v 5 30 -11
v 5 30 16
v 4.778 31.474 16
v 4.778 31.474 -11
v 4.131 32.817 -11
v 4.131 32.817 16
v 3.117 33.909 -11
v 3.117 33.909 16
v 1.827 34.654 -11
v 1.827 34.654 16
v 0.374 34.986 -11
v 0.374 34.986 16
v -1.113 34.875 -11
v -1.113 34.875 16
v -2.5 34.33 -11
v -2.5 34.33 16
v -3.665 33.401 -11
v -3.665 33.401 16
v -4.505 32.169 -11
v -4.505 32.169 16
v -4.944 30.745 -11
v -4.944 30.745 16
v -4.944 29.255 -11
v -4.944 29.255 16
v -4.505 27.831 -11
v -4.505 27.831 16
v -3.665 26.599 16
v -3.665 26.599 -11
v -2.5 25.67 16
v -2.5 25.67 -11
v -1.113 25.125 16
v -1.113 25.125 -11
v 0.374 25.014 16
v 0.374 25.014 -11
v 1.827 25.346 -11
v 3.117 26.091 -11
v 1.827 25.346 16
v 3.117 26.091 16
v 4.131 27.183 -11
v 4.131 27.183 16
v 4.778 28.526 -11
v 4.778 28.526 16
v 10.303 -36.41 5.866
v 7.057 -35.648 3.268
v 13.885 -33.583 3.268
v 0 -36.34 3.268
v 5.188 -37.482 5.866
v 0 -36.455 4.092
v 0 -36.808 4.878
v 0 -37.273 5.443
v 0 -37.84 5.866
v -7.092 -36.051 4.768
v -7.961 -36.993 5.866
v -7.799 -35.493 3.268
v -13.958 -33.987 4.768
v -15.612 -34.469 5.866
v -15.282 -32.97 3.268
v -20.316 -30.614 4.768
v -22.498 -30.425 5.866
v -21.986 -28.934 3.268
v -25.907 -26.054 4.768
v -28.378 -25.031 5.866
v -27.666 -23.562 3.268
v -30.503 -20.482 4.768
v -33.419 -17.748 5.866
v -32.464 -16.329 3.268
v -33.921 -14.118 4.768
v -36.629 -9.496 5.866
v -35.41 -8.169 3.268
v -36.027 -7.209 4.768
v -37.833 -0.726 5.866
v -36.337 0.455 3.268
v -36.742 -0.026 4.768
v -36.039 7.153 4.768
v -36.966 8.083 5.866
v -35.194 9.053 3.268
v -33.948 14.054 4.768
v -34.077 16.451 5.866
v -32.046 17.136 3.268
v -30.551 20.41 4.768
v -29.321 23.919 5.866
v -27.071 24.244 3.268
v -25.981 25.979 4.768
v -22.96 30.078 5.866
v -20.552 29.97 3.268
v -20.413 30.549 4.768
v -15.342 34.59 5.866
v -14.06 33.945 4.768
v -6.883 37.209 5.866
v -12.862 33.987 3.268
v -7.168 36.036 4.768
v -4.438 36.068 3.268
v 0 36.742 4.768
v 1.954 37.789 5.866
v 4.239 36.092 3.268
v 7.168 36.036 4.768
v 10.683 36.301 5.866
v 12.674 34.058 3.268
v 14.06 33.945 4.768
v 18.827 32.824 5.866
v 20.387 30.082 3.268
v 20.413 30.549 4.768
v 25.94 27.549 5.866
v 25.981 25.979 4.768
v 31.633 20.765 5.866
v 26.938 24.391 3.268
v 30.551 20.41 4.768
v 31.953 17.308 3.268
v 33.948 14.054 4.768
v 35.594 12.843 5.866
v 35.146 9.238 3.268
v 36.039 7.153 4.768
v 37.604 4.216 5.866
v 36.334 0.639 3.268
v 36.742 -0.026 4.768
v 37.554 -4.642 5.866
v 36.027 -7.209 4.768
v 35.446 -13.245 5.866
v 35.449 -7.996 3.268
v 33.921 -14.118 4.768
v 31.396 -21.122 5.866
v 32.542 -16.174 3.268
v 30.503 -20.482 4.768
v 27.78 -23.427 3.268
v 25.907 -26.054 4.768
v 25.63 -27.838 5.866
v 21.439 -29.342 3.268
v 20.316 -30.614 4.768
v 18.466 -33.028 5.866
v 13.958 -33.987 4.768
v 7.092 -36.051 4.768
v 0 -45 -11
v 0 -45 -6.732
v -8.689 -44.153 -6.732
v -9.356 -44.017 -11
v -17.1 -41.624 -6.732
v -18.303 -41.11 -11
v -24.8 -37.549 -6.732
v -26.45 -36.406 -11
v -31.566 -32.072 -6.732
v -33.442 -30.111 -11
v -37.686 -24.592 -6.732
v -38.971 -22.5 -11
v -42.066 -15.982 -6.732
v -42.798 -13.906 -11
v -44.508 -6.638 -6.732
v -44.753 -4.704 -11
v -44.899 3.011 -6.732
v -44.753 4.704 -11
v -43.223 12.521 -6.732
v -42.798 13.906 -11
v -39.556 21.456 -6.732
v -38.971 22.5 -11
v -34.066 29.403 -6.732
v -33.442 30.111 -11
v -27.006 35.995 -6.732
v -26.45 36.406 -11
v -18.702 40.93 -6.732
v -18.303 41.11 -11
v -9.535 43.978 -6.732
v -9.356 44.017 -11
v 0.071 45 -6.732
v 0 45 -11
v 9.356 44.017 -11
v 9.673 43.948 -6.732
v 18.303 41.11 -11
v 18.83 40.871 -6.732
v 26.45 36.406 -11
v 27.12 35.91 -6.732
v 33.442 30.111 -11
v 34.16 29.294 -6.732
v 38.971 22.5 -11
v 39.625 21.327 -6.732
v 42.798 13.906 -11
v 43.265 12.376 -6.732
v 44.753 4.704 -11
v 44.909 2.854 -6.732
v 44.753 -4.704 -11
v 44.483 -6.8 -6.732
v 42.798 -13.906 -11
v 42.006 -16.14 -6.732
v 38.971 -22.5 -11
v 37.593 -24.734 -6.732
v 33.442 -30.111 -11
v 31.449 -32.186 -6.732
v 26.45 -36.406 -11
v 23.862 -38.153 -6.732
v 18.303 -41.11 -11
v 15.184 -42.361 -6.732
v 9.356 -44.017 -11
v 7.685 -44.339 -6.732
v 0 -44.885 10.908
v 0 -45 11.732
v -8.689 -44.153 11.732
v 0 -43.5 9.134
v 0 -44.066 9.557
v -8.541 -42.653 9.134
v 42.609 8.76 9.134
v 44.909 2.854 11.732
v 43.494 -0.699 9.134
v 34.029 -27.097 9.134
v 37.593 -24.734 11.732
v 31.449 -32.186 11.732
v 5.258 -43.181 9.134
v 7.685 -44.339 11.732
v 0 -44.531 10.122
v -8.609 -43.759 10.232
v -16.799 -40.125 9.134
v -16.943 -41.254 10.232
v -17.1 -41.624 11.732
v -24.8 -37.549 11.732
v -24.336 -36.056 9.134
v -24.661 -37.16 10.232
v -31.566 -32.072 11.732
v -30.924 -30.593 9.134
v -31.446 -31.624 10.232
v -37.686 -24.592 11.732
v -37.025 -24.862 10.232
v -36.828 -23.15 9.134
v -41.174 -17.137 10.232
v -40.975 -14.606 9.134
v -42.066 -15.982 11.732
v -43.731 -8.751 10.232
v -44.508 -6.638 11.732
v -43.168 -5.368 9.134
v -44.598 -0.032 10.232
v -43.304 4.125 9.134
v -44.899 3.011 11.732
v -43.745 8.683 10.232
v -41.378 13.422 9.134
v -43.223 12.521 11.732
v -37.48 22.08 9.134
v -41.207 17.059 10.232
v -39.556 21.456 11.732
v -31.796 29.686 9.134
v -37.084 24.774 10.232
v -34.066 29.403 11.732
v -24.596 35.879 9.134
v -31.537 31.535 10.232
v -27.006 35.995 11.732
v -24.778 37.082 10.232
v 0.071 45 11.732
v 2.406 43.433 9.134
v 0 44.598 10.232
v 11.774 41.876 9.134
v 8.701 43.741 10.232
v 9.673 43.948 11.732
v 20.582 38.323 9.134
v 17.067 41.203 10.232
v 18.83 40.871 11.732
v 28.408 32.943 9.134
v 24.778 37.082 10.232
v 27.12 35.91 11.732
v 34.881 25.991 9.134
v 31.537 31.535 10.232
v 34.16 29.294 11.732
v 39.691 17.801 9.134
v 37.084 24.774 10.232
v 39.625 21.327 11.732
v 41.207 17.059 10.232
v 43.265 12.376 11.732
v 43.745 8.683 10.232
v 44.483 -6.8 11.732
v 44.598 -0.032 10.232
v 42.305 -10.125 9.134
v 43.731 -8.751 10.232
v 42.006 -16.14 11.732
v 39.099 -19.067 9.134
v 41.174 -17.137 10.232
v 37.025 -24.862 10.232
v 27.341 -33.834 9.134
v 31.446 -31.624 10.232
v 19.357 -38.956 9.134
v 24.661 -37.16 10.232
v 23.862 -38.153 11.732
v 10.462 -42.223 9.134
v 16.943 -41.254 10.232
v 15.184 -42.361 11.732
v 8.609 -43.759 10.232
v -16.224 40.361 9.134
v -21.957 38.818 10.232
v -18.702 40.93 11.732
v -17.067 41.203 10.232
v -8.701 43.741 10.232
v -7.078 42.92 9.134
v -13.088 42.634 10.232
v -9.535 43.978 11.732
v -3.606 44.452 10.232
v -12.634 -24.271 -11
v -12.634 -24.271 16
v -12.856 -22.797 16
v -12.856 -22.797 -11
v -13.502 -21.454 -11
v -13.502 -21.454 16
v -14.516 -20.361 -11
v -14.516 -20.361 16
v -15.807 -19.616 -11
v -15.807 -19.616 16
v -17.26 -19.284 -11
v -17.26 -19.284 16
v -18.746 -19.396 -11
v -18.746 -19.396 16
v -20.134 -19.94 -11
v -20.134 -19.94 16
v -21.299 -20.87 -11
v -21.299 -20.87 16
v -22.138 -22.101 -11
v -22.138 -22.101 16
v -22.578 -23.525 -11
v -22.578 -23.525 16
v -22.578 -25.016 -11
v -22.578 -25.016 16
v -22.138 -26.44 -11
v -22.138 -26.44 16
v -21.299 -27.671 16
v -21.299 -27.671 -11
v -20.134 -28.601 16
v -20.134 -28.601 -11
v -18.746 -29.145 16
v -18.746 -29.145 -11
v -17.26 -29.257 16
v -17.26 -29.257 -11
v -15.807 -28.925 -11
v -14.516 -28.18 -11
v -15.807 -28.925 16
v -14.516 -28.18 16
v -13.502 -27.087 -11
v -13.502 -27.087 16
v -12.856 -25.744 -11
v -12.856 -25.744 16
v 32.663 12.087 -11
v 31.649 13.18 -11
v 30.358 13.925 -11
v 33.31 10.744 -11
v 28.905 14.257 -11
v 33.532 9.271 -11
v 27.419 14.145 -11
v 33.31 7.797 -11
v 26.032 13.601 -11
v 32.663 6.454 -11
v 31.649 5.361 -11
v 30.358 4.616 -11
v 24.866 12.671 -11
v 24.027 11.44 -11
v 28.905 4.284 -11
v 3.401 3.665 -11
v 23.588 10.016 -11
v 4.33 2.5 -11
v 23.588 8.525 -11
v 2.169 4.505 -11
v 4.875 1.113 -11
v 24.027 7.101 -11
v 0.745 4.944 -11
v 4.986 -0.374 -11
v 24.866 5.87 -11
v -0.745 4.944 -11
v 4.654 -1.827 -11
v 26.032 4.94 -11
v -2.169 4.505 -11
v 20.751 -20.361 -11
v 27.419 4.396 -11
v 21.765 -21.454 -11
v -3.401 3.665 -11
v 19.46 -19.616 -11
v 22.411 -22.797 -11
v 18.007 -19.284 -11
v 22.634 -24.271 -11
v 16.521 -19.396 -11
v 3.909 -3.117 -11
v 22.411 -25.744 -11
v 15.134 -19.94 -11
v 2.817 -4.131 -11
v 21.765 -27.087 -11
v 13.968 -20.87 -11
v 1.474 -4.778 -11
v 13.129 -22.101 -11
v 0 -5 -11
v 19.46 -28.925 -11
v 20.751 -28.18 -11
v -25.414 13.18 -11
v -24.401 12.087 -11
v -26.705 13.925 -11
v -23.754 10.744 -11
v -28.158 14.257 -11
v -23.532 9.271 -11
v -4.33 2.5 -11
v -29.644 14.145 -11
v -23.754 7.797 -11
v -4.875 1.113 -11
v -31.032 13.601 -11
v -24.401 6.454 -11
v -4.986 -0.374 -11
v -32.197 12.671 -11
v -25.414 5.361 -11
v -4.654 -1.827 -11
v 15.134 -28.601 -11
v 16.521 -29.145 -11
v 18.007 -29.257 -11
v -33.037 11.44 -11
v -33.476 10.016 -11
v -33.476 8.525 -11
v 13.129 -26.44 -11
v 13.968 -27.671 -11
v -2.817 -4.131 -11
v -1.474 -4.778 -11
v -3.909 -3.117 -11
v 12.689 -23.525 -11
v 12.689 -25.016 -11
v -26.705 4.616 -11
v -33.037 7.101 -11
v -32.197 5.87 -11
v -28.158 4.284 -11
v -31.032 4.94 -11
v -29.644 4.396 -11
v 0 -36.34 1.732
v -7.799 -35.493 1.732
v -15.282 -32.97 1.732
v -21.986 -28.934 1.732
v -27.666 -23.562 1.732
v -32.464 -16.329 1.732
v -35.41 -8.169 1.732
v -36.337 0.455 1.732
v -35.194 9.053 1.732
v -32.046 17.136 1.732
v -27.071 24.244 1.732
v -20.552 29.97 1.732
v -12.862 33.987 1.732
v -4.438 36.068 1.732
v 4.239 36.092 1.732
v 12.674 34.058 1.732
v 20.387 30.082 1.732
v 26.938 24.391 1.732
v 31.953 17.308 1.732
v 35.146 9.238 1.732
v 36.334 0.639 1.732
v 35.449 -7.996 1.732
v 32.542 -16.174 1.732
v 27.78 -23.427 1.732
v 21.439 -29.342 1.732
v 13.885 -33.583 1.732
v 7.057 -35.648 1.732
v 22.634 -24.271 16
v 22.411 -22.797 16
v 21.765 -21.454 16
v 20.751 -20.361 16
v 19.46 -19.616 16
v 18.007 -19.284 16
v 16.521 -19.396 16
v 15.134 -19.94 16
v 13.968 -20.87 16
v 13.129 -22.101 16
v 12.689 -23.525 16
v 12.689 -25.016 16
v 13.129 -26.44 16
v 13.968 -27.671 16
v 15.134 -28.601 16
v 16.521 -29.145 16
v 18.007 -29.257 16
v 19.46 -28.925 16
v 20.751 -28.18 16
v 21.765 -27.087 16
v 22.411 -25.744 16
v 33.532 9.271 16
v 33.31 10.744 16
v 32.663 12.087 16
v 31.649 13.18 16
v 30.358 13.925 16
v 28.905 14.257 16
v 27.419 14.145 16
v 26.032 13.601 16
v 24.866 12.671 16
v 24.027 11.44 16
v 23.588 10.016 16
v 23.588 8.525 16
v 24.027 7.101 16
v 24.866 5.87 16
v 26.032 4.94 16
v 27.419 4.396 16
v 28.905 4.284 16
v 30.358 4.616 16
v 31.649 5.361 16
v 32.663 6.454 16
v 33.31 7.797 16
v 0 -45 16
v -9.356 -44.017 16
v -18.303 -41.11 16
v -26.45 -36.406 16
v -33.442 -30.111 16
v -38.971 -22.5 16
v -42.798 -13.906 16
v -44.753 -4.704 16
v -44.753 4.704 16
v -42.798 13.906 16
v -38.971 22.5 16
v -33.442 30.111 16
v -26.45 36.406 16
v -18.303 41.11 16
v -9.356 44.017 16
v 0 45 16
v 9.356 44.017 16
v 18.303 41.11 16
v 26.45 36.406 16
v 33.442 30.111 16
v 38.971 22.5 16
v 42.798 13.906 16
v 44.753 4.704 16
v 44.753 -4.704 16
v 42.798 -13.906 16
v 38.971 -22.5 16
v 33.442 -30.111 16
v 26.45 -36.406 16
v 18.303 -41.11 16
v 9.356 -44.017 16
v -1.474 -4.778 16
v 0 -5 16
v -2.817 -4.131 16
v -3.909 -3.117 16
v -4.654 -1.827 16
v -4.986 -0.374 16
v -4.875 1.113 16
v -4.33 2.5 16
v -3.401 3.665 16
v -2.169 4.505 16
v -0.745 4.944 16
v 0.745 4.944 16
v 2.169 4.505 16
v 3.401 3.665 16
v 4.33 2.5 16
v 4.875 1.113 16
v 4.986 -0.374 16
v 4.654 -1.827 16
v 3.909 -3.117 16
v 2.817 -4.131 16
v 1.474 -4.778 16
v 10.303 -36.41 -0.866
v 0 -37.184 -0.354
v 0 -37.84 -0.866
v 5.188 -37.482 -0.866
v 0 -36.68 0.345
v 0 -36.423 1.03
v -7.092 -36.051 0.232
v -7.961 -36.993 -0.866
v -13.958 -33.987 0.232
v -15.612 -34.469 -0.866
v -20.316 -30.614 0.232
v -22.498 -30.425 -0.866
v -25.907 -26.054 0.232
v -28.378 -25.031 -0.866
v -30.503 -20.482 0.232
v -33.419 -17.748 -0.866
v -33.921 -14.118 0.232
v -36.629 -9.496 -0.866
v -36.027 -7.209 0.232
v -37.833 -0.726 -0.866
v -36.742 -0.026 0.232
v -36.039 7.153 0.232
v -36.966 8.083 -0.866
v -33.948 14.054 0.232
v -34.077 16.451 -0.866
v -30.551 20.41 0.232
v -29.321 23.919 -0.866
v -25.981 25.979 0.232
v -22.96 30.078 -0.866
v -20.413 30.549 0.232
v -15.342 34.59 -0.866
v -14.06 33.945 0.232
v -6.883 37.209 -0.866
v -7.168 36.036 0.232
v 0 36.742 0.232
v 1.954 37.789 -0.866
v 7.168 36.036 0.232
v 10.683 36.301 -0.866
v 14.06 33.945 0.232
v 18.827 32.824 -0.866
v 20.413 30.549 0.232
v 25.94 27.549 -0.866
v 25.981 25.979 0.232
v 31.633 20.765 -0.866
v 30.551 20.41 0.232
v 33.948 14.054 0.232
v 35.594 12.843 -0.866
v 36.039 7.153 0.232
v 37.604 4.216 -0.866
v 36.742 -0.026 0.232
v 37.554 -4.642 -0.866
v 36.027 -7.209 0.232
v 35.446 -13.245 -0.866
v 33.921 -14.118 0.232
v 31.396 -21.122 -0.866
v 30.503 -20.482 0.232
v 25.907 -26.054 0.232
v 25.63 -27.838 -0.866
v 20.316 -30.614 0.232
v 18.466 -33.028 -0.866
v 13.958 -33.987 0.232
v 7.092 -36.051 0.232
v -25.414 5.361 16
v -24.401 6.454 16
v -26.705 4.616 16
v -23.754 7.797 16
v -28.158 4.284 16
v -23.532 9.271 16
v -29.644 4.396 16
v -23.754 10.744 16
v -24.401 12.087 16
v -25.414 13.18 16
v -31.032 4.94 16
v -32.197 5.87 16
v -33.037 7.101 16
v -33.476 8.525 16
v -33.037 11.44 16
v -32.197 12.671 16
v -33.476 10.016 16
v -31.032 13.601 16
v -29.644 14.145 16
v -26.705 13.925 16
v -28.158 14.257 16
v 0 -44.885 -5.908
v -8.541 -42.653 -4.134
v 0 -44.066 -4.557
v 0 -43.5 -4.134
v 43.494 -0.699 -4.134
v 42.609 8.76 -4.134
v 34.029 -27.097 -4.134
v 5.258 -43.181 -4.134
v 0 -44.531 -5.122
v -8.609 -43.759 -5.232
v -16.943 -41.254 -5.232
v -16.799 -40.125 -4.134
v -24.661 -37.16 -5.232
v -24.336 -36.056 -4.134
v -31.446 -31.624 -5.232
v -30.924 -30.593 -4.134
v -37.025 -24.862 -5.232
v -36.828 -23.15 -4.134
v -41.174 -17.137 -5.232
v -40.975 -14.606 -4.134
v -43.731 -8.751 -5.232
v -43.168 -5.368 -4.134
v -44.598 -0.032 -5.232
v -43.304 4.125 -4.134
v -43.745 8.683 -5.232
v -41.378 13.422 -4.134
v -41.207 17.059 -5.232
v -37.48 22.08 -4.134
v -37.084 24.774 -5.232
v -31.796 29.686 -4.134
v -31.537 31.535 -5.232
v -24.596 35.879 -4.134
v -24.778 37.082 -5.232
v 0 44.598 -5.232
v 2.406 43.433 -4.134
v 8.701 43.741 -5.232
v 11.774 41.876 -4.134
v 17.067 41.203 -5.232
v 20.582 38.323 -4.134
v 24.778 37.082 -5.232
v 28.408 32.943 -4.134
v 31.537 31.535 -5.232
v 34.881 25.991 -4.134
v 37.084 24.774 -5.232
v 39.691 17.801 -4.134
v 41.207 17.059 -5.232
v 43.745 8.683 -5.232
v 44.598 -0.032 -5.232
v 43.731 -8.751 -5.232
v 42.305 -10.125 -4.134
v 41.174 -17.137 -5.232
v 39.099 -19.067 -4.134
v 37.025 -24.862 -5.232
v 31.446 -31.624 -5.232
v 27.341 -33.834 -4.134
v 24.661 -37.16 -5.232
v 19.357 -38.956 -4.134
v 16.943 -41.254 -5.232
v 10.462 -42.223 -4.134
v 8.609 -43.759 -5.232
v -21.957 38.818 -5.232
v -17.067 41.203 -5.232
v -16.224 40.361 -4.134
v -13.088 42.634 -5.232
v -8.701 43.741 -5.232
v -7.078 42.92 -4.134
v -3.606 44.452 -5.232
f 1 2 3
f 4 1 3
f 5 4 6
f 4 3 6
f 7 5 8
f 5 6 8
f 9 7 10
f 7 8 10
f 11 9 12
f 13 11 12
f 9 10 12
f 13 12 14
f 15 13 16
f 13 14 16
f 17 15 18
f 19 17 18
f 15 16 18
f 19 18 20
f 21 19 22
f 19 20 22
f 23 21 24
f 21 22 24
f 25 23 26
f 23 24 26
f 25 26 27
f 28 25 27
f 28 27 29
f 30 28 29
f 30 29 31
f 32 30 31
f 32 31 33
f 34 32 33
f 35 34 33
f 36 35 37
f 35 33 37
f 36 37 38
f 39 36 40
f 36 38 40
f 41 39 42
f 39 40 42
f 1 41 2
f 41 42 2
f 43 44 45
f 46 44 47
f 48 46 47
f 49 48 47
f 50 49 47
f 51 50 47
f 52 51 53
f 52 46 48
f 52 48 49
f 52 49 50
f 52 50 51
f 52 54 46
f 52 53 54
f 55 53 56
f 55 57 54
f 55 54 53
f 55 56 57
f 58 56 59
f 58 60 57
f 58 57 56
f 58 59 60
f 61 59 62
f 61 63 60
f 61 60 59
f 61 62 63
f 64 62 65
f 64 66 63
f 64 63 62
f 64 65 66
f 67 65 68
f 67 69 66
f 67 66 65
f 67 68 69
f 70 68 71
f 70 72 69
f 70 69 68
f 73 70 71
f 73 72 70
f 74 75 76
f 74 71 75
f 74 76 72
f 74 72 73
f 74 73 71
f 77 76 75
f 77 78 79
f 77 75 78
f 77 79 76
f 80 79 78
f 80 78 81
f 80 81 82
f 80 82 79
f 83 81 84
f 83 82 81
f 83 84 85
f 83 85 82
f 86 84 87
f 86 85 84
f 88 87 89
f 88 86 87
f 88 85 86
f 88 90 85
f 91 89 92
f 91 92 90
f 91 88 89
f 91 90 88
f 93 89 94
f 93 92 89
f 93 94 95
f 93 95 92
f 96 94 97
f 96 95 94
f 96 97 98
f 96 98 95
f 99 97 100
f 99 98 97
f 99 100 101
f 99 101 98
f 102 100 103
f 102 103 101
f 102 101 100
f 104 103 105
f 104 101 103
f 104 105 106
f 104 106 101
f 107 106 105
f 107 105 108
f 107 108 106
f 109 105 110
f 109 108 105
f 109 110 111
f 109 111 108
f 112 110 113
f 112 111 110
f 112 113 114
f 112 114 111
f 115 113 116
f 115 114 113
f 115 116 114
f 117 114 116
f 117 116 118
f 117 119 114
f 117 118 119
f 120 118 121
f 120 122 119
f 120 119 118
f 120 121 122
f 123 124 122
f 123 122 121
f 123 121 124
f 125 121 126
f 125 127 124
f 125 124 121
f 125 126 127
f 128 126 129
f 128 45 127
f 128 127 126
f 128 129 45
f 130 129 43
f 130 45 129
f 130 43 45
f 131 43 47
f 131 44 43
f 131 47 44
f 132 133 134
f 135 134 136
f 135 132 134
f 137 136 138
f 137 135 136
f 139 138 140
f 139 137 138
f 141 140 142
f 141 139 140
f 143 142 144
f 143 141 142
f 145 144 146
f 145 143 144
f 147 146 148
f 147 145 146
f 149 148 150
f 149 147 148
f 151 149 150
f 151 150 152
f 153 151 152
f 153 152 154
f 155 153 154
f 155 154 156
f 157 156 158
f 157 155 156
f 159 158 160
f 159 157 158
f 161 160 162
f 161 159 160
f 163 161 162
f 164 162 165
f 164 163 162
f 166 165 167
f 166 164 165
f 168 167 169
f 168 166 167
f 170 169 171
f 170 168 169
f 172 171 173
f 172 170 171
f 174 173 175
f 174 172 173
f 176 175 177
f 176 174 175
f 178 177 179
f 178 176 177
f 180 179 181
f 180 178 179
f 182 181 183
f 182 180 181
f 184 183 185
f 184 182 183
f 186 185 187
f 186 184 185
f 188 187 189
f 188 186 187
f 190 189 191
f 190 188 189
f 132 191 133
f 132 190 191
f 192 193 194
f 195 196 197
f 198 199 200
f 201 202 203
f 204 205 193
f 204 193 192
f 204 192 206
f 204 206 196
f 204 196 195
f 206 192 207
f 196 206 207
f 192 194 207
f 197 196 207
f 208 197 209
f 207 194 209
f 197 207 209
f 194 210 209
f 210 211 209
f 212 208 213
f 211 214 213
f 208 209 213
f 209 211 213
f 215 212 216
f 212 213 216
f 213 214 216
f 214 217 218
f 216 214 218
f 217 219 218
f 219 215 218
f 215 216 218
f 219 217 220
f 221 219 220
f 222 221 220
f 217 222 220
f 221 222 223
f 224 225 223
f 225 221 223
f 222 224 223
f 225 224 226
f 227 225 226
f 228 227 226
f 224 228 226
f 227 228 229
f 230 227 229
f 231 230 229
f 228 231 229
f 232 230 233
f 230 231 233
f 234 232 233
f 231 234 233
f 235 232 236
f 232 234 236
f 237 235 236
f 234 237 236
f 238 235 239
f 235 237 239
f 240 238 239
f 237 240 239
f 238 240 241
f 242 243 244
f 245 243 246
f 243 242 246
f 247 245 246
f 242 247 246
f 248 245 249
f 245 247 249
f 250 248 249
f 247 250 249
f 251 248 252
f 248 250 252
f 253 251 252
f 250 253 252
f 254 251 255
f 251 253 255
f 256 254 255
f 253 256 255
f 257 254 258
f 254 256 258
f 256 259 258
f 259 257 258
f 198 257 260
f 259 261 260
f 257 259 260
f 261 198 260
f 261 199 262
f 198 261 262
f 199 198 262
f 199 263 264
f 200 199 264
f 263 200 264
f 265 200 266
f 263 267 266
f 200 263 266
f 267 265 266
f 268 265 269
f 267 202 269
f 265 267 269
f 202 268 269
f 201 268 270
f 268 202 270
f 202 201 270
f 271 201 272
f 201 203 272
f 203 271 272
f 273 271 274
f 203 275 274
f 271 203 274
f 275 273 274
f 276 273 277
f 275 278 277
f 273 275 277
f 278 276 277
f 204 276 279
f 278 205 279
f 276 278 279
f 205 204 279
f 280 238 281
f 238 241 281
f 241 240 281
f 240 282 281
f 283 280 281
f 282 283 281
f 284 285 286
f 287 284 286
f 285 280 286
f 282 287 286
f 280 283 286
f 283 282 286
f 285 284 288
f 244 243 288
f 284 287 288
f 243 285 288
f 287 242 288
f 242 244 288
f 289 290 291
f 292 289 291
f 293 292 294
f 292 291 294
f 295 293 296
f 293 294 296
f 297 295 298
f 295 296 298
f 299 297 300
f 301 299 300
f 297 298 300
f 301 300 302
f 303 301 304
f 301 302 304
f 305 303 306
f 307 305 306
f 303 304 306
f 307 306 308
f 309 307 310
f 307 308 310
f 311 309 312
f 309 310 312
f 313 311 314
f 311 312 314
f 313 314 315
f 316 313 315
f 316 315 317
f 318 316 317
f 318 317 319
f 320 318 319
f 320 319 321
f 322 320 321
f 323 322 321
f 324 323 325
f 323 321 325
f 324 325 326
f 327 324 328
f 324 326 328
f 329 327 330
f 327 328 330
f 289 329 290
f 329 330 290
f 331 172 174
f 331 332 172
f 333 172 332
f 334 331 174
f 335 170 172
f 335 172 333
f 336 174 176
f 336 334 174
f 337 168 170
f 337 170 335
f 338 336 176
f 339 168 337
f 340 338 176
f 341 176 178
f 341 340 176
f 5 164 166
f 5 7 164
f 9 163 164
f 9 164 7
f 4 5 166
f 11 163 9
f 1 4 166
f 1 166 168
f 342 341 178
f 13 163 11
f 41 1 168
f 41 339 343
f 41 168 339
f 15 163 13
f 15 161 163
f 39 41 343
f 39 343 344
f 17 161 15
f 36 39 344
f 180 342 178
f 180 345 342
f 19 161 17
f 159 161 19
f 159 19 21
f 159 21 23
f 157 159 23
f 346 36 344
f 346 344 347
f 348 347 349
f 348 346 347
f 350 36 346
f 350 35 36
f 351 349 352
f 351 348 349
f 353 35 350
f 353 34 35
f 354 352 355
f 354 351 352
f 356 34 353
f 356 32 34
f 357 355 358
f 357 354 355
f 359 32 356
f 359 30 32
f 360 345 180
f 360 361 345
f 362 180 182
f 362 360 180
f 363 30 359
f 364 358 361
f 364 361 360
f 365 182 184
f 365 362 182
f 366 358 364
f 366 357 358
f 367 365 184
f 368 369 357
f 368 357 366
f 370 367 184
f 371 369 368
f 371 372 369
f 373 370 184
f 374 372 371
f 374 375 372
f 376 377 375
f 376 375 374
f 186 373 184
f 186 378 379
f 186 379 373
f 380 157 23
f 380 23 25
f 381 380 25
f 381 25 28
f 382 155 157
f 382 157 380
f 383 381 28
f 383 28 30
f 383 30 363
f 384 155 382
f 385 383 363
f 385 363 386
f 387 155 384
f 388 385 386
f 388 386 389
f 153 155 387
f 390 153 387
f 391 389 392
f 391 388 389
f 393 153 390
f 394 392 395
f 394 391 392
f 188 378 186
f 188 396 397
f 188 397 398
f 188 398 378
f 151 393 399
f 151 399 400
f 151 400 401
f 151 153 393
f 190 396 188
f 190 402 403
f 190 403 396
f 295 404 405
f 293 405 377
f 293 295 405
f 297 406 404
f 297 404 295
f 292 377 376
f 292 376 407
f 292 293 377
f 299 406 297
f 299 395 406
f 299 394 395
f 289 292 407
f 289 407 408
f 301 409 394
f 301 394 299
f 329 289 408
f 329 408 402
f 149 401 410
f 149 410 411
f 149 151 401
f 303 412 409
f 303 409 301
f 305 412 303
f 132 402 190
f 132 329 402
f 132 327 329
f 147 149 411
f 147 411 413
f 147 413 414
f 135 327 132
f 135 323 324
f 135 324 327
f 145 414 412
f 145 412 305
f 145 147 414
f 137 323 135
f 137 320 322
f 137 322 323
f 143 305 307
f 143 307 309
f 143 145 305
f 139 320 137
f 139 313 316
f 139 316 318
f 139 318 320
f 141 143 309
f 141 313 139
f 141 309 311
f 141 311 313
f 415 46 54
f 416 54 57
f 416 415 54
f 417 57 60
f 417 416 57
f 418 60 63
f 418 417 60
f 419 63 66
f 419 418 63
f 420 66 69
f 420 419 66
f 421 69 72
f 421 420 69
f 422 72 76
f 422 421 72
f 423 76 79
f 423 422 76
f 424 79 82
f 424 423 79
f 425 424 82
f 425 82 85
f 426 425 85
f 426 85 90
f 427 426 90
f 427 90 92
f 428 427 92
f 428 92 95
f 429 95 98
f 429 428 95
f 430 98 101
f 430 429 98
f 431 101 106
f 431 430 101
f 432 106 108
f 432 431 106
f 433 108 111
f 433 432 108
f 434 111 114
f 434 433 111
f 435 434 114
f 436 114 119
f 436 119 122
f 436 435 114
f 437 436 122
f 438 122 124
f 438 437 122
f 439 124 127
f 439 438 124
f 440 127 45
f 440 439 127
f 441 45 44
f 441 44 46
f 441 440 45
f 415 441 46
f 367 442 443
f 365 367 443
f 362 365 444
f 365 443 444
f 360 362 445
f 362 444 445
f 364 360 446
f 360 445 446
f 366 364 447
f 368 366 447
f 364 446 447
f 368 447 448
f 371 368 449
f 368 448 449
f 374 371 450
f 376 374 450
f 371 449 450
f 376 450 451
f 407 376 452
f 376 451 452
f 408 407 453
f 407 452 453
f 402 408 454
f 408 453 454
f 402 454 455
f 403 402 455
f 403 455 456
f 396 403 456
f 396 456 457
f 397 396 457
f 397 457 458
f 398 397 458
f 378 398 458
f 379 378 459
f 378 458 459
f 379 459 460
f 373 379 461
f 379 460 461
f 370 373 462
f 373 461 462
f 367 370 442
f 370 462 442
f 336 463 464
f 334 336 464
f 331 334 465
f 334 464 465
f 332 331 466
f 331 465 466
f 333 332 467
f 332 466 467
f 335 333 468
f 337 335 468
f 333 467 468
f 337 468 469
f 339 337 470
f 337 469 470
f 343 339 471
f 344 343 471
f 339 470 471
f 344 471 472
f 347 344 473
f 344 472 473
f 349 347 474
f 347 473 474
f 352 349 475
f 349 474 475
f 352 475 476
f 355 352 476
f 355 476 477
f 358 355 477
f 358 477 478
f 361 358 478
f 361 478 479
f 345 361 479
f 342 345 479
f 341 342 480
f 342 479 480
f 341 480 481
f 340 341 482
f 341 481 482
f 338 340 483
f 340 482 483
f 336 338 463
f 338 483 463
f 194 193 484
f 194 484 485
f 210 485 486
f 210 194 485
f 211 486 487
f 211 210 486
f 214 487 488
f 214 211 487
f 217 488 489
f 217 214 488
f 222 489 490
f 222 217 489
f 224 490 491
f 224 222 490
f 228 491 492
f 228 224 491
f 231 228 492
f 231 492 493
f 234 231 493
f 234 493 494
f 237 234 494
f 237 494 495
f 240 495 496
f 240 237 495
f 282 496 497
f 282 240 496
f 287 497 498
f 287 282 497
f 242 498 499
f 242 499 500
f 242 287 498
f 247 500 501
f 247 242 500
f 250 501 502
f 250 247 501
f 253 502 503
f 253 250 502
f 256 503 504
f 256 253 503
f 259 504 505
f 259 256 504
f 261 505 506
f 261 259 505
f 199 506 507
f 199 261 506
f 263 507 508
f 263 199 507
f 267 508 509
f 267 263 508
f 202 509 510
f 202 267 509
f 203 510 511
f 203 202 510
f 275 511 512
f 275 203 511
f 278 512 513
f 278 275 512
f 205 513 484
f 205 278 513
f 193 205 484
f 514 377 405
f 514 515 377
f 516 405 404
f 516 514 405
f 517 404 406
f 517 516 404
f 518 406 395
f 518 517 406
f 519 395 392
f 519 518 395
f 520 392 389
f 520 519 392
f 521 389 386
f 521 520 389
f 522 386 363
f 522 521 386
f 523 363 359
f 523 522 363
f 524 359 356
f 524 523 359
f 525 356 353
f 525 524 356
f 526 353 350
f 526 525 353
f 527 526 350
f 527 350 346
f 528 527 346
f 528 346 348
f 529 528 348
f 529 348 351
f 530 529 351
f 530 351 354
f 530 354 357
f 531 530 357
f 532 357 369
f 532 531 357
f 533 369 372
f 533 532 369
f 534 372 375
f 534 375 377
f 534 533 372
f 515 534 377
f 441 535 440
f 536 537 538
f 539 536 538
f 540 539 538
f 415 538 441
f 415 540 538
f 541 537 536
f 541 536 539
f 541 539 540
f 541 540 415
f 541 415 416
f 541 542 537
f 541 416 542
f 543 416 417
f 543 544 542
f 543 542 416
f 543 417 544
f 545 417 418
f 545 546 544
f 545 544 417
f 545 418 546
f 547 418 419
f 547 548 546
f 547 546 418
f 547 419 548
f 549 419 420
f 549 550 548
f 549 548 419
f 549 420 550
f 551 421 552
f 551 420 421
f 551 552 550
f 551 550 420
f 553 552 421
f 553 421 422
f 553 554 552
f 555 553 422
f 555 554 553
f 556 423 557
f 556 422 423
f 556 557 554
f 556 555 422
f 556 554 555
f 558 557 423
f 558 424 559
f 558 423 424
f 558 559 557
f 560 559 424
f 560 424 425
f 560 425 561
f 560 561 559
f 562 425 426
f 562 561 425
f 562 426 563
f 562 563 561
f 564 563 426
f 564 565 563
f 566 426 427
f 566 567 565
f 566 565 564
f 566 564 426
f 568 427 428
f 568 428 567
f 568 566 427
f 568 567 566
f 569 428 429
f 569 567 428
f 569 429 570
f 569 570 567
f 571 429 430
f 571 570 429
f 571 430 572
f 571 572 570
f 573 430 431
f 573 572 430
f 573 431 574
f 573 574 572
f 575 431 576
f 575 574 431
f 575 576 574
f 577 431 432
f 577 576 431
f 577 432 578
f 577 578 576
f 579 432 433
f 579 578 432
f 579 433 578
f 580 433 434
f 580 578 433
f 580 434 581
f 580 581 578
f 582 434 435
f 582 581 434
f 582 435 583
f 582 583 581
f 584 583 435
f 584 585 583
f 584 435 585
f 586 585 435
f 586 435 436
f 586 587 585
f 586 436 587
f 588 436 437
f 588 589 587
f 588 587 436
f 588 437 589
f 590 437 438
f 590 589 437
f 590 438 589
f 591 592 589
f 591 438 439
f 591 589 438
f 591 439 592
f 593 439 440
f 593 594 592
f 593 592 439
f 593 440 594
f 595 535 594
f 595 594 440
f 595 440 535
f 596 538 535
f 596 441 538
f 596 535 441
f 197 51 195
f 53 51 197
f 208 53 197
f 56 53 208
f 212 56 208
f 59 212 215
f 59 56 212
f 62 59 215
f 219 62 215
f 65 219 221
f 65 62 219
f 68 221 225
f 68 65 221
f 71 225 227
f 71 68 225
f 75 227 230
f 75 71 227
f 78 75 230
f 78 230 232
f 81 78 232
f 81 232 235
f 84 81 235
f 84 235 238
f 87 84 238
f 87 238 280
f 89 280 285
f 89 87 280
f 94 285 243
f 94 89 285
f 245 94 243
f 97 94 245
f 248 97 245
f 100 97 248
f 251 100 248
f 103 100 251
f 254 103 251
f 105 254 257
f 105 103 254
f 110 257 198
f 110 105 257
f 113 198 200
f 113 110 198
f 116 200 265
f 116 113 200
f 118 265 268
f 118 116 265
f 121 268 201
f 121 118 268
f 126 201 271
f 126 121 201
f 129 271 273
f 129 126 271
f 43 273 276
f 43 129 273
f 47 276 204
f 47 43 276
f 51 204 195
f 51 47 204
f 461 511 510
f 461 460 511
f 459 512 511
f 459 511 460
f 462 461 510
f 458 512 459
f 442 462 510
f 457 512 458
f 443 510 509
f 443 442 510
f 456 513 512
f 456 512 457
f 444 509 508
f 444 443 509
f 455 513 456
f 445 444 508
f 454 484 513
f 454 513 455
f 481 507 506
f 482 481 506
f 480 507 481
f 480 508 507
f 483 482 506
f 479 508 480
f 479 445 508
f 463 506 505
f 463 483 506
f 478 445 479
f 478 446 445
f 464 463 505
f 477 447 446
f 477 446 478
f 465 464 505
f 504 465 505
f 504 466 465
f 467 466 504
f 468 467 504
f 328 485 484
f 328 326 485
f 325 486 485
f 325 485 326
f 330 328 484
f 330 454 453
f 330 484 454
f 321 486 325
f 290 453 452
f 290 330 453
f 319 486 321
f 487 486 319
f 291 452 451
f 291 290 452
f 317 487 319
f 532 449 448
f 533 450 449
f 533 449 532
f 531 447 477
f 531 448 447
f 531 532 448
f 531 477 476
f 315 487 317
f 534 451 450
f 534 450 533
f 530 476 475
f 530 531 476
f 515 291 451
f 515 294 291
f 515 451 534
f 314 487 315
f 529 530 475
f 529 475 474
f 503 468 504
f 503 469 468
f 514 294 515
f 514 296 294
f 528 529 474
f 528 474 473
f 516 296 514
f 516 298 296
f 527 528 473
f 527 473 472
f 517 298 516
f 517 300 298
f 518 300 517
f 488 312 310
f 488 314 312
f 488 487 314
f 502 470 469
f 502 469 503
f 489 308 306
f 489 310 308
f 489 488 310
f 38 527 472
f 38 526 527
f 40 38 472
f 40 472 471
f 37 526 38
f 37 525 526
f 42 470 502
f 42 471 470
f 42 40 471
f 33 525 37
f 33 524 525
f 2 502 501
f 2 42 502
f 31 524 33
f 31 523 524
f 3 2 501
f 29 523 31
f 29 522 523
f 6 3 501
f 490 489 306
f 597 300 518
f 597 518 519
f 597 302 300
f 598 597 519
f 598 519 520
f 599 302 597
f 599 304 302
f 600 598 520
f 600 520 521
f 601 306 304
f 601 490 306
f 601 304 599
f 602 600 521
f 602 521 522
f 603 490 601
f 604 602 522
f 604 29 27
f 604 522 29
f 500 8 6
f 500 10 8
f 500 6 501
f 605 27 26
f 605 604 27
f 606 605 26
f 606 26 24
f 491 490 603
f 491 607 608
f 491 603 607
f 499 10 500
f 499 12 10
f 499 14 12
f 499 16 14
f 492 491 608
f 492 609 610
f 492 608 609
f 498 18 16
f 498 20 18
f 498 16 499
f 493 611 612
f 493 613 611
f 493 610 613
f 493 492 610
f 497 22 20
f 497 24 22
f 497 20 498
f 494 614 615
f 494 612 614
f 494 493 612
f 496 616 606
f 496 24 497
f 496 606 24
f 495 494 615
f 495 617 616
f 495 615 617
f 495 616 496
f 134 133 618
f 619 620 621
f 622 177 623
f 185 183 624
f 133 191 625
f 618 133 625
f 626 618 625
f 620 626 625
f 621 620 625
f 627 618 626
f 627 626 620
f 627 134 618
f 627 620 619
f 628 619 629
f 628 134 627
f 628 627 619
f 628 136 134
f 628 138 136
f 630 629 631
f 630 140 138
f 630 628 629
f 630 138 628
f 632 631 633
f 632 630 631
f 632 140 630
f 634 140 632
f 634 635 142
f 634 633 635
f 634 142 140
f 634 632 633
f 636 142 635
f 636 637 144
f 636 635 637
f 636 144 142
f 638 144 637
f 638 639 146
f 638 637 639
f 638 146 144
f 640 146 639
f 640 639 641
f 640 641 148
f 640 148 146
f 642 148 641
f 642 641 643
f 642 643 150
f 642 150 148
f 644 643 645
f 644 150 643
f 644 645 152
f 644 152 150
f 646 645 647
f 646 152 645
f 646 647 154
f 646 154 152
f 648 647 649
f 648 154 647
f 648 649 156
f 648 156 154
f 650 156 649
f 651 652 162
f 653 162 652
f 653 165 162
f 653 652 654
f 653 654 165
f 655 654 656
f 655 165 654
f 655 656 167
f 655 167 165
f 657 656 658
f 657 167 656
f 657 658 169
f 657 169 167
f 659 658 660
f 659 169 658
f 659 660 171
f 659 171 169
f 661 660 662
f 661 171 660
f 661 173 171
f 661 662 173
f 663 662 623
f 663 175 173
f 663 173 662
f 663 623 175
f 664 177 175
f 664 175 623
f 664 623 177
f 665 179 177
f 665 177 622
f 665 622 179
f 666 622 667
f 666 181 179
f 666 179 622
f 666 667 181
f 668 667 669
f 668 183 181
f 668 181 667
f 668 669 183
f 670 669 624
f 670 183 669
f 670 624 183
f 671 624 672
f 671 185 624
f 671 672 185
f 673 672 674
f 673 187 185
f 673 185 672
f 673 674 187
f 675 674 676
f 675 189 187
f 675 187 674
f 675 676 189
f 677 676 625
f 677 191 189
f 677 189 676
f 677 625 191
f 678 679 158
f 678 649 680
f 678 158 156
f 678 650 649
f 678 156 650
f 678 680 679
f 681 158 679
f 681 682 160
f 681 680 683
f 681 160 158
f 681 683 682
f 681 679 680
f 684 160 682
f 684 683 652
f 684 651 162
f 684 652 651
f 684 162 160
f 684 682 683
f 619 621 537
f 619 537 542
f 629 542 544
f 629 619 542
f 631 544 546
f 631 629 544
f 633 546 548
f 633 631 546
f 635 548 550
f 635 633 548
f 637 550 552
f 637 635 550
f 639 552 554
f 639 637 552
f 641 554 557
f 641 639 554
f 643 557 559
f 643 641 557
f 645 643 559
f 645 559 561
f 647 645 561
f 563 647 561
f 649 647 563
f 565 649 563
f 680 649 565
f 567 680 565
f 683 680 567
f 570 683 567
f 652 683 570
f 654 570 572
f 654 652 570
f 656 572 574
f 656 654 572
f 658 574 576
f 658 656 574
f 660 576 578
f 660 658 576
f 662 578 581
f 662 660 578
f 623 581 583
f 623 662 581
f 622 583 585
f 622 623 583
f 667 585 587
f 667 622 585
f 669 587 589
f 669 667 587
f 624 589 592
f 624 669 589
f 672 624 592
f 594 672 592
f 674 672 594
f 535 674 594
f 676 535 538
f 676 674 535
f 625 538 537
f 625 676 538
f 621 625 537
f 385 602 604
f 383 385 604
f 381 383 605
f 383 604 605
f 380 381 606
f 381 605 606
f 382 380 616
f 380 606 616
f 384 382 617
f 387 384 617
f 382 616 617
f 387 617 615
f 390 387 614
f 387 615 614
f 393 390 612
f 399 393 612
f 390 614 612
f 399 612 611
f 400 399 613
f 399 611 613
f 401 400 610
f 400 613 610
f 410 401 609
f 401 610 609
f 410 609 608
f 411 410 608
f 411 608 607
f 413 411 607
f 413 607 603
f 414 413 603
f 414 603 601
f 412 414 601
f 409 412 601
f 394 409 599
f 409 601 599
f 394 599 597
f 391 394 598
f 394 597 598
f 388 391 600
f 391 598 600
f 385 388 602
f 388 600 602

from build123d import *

# Parameters (mm, degrees)
F2_R     = 5
F3_DEPTH = 27
F4_R     = 3


with BuildPart() as f1:
    # F0 (on Right) → F1 (revolve)
    with BuildSketch(Plane.YZ):
        Polygon((-45, -11), (-5, -11), (-5, 16), (-45, 16), (-45, 10), (-36.339746, 5), (-36.339746, 0), (-45, -5), align=None)
    revolve(axis=Axis((0, 0, 0.272177), (0, 0, -1)))

    # F2 (on face) → F3 (cut, through all)
    with BuildSketch(Plane.XY.offset(16)):
        with Locations((0, 30)):
            Circle(F2_R)
        with Locations((-28.531695, 9.27051)):
            Circle(F2_R)
        with Locations((-17.633558, -24.27051)):
            Circle(F2_R)
        with Locations((17.633558, -24.27051)):
            Circle(F2_R)
        with Locations((28.531695, 9.27051)):
            Circle(F2_R)
    extrude(amount=-F3_DEPTH, mode=Mode.SUBTRACT)

    # F4
    f4_edges = [f1.edges().sort_by_distance(p)[0] for p in [
        (0, 36.339746, 0),
        (0, 36.339746, 5),
        (0, 45, -5),
        (0, 45, 10),
    ]]
    fillet(f4_edges, radius=F4_R)


solid = f1.part
